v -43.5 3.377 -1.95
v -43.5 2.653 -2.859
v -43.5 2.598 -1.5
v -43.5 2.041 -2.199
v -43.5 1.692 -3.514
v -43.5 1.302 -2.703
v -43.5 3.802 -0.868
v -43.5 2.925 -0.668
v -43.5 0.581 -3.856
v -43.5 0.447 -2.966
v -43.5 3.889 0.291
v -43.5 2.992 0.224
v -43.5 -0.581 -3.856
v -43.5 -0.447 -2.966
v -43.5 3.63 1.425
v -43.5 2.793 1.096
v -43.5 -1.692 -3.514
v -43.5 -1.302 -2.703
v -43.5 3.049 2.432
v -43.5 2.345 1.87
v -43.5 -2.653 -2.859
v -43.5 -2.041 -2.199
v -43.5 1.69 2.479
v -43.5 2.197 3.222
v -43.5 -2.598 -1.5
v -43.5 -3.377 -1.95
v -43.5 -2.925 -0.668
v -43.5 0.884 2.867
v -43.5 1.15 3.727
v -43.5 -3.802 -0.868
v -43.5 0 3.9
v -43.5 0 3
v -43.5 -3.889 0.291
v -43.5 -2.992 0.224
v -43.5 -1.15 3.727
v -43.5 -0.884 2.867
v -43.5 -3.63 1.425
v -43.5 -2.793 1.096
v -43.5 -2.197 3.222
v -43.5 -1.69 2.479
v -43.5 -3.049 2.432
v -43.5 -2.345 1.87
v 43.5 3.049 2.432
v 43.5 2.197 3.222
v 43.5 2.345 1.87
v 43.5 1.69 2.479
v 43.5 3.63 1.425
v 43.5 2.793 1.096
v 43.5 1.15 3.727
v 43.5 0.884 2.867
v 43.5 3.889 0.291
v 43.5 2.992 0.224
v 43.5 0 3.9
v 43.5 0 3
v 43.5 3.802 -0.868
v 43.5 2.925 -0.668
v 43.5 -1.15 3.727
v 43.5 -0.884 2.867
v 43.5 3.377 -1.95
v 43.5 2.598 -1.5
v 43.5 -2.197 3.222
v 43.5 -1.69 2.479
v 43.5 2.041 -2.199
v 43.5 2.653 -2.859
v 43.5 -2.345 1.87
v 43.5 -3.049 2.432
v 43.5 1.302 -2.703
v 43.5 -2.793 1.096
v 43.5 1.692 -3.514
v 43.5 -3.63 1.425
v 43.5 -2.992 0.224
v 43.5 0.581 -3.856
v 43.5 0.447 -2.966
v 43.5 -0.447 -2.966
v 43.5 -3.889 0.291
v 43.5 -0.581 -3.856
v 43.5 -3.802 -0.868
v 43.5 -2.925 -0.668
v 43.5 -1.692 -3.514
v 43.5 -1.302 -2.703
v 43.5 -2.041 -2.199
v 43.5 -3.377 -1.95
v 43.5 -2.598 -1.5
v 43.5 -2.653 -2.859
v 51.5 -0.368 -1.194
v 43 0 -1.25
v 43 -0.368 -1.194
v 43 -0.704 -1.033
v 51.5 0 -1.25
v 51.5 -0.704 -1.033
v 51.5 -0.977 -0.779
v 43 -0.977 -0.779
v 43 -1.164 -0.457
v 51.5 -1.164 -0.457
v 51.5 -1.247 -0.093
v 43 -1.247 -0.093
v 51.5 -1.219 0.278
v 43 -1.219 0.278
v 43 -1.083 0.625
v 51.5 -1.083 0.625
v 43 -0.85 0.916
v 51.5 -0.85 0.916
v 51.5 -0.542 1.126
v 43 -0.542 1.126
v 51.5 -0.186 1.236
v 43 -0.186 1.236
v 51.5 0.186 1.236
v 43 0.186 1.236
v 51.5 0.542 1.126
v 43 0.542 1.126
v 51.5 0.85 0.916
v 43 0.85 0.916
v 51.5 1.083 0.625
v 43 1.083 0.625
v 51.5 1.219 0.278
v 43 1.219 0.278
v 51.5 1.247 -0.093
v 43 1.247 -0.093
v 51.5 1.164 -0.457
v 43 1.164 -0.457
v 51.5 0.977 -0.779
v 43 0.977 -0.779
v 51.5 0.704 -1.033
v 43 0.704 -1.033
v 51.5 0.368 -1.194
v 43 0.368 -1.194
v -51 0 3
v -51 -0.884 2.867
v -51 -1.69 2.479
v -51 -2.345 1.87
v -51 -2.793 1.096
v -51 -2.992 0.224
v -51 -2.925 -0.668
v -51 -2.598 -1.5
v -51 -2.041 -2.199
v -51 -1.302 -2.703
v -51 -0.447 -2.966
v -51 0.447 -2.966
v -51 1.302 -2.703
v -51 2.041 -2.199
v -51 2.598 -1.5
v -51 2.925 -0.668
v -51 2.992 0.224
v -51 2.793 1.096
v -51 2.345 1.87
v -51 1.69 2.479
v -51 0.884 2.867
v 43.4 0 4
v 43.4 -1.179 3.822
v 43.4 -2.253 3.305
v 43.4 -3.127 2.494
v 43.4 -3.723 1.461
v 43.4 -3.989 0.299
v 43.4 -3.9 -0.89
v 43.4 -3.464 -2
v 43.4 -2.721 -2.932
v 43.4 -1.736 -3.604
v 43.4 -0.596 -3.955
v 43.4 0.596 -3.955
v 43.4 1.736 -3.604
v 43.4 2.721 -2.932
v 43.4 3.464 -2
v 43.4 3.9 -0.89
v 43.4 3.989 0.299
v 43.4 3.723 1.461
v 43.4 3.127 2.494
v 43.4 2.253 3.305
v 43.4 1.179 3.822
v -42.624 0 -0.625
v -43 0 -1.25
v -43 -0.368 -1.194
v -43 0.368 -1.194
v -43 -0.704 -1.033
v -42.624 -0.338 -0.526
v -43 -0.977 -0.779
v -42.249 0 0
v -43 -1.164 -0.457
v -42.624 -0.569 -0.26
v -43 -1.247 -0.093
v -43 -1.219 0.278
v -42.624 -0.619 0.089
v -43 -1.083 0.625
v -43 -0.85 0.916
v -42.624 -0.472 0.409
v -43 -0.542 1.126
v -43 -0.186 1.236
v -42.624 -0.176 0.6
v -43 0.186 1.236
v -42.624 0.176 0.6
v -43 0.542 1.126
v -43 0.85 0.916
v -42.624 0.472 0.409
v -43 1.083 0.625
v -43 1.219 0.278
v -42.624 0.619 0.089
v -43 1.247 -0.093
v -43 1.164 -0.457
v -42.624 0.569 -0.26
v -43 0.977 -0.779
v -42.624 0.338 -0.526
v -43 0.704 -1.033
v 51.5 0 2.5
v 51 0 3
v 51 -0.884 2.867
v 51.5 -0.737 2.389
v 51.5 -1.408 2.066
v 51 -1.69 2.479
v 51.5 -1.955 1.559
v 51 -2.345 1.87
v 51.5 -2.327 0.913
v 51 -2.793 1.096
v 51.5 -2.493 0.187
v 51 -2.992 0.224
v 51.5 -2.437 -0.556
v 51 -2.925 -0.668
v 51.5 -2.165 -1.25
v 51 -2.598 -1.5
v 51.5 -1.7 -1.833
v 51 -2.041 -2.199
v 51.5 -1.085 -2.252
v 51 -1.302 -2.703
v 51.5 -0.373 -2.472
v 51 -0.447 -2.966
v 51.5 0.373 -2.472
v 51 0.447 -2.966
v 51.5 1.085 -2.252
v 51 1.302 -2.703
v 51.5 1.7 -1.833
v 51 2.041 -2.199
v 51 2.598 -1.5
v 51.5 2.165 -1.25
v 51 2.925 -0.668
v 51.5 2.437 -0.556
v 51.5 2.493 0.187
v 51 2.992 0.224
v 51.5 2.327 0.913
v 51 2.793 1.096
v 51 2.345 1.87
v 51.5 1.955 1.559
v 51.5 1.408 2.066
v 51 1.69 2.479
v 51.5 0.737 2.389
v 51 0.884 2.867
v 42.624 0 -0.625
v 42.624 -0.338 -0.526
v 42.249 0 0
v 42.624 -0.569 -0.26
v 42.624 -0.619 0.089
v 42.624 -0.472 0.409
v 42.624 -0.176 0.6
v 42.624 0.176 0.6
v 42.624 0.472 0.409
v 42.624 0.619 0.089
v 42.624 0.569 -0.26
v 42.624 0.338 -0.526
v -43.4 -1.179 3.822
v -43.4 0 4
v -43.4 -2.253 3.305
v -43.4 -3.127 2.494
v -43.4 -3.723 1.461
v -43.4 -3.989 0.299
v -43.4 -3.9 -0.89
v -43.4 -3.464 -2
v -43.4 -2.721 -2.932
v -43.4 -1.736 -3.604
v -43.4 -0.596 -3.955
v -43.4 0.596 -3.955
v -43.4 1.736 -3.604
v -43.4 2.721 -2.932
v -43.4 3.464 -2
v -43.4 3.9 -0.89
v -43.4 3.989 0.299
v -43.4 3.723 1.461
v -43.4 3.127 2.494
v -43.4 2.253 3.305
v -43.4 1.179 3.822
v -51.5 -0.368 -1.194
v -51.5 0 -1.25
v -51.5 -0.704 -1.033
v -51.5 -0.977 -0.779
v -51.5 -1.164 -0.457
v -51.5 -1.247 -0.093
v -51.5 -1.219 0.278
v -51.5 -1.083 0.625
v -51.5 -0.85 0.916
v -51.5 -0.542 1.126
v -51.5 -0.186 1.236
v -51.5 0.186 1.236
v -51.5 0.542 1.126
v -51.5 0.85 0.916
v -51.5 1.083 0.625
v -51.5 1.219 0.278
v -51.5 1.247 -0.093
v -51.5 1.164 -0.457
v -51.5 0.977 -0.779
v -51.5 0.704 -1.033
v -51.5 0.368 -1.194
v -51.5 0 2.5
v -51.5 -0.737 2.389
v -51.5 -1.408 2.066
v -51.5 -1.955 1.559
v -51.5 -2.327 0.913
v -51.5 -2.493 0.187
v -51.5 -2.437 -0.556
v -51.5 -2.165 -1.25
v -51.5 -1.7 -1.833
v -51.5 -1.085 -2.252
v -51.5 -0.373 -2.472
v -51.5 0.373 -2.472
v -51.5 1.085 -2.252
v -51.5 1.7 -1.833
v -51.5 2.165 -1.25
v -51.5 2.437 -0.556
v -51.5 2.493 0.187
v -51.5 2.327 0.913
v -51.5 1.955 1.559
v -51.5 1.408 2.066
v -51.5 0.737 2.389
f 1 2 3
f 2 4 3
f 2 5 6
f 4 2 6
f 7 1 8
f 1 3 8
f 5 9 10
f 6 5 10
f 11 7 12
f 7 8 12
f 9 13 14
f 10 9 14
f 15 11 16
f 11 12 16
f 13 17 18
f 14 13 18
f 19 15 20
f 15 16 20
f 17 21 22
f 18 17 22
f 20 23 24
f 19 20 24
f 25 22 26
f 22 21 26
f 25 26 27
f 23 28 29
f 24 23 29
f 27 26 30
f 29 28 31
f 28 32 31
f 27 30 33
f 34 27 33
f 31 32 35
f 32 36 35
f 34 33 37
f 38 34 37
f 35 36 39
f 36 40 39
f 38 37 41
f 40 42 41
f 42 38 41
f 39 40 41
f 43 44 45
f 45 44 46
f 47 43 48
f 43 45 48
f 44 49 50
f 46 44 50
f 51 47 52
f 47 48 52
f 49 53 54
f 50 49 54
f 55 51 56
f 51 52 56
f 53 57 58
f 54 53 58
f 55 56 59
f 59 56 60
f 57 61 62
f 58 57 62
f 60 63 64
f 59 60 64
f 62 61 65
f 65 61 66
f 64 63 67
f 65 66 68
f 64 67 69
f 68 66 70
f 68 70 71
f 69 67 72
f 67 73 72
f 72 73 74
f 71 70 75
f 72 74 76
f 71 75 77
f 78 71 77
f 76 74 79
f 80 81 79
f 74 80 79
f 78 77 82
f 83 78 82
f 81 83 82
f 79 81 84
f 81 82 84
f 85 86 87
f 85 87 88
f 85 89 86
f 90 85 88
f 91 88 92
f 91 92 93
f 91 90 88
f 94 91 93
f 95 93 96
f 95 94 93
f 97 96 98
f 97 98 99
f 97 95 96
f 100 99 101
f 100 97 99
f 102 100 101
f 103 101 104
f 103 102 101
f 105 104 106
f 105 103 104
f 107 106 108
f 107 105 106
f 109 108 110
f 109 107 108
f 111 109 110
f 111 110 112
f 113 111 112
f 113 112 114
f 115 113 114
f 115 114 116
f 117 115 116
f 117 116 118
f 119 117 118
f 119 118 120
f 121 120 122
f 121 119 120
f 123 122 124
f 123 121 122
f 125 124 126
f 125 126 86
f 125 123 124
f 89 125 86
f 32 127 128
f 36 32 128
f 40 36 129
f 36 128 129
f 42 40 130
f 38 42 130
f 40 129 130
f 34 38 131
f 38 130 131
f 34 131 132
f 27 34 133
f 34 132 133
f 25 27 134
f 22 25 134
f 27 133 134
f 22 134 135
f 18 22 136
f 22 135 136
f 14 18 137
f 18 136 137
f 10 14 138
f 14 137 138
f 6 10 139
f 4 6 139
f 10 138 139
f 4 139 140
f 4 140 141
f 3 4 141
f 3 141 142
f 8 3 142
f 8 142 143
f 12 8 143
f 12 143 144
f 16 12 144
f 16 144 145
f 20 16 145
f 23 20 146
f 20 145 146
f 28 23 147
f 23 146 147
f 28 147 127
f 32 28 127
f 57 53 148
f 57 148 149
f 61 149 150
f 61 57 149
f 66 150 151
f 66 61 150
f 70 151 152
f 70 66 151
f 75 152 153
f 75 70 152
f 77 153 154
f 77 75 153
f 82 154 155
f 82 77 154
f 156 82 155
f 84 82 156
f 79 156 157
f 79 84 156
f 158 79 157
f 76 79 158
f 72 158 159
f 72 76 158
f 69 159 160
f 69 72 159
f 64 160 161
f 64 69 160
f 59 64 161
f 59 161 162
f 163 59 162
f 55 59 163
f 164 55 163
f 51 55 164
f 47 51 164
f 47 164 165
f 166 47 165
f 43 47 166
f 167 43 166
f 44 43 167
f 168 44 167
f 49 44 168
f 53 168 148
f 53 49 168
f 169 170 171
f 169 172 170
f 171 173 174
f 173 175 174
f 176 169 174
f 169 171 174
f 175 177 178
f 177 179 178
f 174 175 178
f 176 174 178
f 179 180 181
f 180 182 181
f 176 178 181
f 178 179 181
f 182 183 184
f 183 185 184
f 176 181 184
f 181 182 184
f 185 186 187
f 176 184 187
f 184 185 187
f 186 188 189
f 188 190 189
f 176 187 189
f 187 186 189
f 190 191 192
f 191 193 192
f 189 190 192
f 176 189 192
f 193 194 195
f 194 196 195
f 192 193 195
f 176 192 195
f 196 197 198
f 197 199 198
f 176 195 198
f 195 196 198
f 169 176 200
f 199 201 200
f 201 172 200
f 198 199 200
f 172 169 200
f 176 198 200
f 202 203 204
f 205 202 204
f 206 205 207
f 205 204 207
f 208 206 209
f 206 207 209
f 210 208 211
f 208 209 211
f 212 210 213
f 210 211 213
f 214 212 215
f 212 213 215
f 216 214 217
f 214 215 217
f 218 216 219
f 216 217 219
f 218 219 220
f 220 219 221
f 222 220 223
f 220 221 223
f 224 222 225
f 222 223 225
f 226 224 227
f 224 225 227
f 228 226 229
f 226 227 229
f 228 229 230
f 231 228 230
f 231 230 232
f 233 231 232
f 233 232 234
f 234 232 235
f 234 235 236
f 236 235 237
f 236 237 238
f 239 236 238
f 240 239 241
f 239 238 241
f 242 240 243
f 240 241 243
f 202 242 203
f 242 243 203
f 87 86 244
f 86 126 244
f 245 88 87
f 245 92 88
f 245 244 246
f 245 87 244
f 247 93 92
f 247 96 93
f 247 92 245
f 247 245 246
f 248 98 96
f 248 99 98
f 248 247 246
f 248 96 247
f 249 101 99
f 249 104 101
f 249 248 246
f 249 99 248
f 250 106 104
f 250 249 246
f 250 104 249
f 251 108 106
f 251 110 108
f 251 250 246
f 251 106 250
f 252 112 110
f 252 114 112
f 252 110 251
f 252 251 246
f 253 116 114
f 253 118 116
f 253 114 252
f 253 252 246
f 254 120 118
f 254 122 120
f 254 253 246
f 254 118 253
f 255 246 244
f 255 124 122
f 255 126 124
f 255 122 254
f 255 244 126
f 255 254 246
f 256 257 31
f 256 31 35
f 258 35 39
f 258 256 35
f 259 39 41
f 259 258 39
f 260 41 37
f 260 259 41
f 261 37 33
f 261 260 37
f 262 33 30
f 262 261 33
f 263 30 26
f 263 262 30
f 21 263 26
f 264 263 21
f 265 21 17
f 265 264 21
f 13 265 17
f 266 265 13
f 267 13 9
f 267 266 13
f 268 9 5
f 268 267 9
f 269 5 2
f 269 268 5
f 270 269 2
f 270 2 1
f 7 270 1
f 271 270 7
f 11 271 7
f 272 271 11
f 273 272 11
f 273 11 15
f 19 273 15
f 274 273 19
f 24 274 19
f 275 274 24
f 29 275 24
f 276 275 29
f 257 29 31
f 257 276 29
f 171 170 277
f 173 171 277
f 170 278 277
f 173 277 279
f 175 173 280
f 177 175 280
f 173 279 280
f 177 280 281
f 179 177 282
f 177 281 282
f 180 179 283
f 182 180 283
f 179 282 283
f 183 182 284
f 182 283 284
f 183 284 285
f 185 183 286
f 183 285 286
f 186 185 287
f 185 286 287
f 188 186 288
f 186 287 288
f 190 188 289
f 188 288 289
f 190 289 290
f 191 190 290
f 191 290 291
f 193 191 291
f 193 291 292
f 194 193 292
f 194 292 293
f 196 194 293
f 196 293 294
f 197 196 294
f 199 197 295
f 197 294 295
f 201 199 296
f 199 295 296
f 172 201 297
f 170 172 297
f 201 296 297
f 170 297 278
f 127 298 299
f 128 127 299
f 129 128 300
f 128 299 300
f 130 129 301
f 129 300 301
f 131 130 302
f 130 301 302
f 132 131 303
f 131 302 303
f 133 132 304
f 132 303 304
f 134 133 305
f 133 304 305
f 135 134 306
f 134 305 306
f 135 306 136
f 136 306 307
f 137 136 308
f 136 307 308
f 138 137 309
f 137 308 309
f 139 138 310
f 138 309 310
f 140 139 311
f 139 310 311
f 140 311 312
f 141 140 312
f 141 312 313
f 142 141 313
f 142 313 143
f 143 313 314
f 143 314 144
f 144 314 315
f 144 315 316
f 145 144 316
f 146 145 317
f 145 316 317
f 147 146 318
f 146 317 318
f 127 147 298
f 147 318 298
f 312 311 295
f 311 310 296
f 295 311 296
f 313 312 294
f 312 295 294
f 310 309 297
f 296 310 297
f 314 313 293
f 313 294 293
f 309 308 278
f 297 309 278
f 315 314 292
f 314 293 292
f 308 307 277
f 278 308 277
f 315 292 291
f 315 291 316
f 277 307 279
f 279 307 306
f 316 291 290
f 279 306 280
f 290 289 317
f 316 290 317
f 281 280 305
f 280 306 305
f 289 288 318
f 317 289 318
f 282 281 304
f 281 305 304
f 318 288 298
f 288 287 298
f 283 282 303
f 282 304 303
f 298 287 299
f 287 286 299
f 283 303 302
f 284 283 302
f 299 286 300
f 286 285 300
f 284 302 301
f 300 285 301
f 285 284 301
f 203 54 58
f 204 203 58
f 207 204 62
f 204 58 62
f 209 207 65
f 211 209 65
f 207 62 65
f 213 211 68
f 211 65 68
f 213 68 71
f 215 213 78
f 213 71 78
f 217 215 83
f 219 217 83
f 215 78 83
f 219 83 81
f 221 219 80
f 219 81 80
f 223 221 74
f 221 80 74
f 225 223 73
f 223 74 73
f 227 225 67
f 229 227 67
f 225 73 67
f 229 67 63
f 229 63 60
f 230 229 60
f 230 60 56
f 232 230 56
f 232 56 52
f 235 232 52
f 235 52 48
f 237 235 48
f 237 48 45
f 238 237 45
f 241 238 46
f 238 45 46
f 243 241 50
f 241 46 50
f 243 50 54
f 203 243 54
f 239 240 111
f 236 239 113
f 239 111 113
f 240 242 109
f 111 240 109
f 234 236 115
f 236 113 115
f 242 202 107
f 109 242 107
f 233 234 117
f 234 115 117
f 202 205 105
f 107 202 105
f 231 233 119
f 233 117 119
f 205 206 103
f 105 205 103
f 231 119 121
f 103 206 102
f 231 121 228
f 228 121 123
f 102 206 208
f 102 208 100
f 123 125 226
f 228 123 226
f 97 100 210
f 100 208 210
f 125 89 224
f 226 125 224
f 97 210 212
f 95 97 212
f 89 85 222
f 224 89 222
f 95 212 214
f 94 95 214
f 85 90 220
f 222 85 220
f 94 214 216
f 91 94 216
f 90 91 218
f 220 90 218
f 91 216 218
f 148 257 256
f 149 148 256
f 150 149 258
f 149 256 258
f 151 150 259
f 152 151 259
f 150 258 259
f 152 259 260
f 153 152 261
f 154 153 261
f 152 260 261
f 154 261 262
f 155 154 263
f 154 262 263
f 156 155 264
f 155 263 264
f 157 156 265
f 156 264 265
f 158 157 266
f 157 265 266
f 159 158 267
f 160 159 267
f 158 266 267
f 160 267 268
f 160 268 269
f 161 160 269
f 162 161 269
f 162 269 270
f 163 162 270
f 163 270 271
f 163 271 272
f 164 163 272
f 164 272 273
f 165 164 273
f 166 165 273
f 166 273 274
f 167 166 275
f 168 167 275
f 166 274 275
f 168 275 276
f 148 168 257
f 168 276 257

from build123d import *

# Parameters (mm, degrees)
CHAMFER_1_SIZE = 0.5
CHAMFER_2_SIZE = 0.1


with BuildPart() as part:
    # ｽｹｯﾁ1 → 回転1 (revolve)
    with BuildSketch(Plane.XY, mode=Mode.PRIVATE) as revolve_1_sk:
        Polygon((43.5, 4), (-43.5, 4), (-43.5, 3), (-51.5, 3), (-51.5, 0), (51.5, 0), (51.5, 3), (43.5, 3), align=None)
    revolve(revolve_1_sk.sketch.rotate(Axis((-61.290700214, 0, 0), (1, 0, 0)), 90), axis=Axis((-61.290700214, 0, 0), (1, 0, 0)))

    # 面取り1
    chamfer_1_edges = [part.edges().sort_by_distance(p)[0] for p in [
        (-51.5, 0, -3),
        (51.5, 0, -3),
    ]]
    chamfer(chamfer_1_edges, length=CHAMFER_1_SIZE)

    # 面取り2
    chamfer_2_edges = [part.edges().sort_by_distance(p)[0] for p in [
        (-43.5, 0, -4),
        (43.5, 0, -4),
    ]]
    chamfer(chamfer_2_edges, length=CHAMFER_2_SIZE)

    # ｽｹｯﾁ3 → M3 ねじ穴1 (revolve, cut)
    with BuildSketch(Plane(origin=(51.5, 0, 0), x_dir=(0, 0, -1), z_dir=(0, 1, 0))):
        Polygon((0, 0), (0, 9.251075774), (1.25, 8.5), (1.25, 0), align=None)
    hole_wizard_m3_1 = revolve(axis=Axis((57.85, 0, 0), (-1, 0, 0)), mode=Mode.SUBTRACT)

    # ﾐﾗｰ1: M3 ねじ穴1 across plane
    add(hole_wizard_m3_1.mirror(Plane(origin=(0, 0, 0), x_dir=(0, 0, 1), z_dir=(1, 0, 0))), mode=Mode.SUBTRACT)


solid = part.part
